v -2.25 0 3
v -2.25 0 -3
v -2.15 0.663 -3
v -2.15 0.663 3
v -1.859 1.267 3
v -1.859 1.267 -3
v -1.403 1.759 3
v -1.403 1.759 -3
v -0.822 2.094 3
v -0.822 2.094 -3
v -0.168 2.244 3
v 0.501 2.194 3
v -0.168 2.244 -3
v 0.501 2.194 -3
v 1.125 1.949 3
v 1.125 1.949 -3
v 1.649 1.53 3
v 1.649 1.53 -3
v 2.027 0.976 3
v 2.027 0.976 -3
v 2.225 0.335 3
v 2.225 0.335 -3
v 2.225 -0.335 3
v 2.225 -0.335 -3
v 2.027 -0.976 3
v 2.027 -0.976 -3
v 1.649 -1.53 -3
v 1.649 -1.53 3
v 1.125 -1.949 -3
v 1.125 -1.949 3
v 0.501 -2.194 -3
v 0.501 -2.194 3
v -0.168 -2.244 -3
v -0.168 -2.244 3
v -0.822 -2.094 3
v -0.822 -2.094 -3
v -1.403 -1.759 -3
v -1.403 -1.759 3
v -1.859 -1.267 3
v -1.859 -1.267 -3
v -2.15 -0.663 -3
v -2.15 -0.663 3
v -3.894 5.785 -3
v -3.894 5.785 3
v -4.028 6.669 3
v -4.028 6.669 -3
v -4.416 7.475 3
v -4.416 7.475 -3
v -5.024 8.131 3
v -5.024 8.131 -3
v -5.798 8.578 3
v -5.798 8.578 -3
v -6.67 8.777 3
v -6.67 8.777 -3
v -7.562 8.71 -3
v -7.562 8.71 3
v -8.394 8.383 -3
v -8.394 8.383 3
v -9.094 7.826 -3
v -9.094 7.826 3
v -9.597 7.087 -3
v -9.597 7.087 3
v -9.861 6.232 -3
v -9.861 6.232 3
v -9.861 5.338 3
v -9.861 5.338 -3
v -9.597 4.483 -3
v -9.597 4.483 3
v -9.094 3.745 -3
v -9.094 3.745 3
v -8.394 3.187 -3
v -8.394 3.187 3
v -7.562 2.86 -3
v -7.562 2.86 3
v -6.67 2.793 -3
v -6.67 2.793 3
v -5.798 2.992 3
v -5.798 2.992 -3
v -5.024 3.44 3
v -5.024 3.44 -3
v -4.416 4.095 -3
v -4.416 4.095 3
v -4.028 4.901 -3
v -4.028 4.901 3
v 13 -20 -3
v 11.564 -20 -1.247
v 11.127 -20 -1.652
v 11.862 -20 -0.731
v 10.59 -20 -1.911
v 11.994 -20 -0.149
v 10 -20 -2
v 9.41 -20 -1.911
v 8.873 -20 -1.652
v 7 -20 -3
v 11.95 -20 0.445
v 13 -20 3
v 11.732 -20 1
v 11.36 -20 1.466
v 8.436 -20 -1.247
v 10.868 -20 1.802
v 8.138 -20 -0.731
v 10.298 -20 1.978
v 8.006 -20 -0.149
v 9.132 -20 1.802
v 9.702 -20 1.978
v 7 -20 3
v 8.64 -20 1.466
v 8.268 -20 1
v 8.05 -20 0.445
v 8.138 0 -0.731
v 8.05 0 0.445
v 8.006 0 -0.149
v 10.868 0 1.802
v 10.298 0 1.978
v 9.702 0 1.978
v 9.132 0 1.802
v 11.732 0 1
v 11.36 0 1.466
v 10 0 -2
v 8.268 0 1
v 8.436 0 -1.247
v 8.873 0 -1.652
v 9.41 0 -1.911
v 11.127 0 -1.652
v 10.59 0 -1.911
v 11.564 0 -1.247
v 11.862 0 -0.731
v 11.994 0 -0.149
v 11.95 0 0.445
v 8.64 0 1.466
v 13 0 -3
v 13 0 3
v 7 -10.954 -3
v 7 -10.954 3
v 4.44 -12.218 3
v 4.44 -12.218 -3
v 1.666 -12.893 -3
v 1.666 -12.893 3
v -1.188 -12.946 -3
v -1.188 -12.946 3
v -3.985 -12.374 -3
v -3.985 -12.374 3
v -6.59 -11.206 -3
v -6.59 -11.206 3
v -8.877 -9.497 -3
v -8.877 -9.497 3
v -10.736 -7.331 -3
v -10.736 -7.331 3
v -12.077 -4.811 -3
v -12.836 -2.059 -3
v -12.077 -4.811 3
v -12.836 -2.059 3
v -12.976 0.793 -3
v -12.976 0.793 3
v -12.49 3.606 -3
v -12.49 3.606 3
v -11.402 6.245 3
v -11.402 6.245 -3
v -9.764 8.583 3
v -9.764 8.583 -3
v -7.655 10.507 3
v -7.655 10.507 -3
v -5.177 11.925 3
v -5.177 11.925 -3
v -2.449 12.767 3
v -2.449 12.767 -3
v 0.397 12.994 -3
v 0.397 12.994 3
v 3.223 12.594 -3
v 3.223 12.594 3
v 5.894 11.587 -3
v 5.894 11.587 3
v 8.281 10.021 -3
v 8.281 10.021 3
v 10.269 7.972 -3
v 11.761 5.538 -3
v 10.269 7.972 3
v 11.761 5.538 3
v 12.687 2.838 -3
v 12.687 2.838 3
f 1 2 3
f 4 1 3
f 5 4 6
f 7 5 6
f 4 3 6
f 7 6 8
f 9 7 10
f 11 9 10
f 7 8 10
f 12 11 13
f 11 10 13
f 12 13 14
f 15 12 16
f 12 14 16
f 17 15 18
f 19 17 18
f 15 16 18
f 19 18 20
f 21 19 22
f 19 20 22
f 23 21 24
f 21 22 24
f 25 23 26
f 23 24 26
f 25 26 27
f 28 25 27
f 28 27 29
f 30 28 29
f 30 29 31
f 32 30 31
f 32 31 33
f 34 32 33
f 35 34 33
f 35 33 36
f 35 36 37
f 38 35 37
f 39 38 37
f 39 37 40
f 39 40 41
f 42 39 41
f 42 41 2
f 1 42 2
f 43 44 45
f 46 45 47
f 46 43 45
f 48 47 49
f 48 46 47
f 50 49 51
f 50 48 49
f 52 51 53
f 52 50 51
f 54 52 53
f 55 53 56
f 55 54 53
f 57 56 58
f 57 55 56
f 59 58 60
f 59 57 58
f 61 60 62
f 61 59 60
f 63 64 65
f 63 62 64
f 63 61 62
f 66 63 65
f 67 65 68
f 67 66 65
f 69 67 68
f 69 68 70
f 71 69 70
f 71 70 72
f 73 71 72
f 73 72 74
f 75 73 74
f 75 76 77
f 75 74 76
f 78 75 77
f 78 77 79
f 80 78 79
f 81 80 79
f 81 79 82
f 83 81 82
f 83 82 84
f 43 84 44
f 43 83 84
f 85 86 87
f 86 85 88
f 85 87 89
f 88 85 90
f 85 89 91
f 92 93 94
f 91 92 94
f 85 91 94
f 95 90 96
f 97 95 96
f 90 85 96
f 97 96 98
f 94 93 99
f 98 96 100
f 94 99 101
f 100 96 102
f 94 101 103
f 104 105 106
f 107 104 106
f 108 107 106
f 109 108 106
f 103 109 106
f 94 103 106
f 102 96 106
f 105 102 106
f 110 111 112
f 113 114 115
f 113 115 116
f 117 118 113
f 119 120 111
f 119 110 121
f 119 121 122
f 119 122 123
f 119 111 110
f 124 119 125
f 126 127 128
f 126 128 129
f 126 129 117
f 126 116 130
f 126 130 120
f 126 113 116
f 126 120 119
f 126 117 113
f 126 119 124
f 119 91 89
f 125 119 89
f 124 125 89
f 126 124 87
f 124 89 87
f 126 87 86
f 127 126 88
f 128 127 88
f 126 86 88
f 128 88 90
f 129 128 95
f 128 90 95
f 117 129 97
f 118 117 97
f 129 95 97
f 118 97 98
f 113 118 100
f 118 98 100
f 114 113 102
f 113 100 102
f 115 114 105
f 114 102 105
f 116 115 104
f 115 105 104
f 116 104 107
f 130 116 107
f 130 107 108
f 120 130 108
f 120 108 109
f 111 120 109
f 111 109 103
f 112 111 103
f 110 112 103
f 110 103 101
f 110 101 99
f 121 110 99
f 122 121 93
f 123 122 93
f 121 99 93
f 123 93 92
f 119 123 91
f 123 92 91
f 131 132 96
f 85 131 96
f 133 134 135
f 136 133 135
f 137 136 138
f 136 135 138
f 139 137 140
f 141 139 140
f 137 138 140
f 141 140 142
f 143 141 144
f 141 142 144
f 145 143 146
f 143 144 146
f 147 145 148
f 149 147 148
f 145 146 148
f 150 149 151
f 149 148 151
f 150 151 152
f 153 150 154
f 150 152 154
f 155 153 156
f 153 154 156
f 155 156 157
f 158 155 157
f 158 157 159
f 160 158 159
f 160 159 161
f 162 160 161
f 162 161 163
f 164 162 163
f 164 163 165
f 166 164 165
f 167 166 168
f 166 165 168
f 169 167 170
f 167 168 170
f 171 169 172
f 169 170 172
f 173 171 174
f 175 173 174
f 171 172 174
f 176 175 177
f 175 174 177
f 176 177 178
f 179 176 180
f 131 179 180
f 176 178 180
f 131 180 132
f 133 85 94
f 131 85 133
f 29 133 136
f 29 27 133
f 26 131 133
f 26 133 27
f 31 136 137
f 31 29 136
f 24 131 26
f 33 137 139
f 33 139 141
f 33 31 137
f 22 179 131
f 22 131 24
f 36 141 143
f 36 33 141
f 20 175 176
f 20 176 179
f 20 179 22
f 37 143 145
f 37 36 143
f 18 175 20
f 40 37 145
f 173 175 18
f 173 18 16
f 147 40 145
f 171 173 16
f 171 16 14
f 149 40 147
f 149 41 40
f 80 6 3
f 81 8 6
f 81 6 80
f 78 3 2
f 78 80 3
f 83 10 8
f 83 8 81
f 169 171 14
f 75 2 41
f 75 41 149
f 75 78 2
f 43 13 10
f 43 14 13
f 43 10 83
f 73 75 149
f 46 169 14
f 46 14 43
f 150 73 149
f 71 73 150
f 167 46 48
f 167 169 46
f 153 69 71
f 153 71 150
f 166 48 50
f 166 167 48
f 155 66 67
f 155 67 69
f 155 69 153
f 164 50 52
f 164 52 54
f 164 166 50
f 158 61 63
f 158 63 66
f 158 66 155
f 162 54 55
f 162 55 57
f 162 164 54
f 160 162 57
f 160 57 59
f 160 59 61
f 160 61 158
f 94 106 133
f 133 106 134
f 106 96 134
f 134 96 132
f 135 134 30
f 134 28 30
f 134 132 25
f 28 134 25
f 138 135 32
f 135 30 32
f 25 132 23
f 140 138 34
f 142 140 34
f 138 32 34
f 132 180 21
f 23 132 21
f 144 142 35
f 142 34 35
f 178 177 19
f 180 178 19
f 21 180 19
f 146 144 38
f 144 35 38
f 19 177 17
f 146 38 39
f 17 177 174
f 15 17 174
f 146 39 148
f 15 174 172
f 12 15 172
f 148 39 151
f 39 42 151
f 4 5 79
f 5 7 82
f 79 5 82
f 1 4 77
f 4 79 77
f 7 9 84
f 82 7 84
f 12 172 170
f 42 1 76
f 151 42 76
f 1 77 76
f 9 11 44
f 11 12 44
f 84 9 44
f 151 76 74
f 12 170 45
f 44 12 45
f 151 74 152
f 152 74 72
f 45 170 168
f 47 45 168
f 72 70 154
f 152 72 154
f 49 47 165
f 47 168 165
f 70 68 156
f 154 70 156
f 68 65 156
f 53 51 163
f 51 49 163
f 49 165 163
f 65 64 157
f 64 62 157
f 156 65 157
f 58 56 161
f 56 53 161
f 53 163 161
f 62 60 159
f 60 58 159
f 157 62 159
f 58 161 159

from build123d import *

# Parameters (mm, degrees)
BOSS_EXTRUDE1_DEPTH  = 3
M4_CLEARANCE_HOLE1_D = 4.5
SKETCH5_R            = 2
CUT_EXTRUDE1_DEPTH   = 20
SKETCH8_R            = 3
CUT_EXTRUDE3_DEPTH   = 25.596747752


with BuildPart() as part:
    # Sketch2 → Boss-Extrude1 (new, symmetric)
    with BuildSketch(Plane.XY):
        with BuildLine():
            Line((13, 0), (13, -20))
            Line((13, -20), (7, -20))
            Line((7, -20), (7, -10.95445115))
            ThreePointArc((7, -10.95445115), (-11.401754251, 6.244997998), (13, 0))
        make_face()
    extrude(amount=BOSS_EXTRUDE1_DEPTH, both=True)

    # M4 Clearance Hole1 (through all)
    with Locations(Plane.XY.offset(3)):
        with Locations((0, 0)):
            Hole(M4_CLEARANCE_HOLE1_D / 2)

    # Sketch5 → Cut-Extrude1 (cut)
    with BuildSketch(Plane.XZ.offset(20)):
        with Locations(Location((10, 0, 0), (0, 0, 270))):
            Circle(SKETCH5_R)
    extrude(amount=-CUT_EXTRUDE1_DEPTH, mode=Mode.SUBTRACT)

    # Sketch8 → Cut-Extrude3 (cut, through all)
    with BuildSketch(Plane.XY.offset(-3)):
        with Locations((-6.894399988, 5.785088487)):
            Circle(SKETCH8_R)
    extrude(amount=CUT_EXTRUDE3_DEPTH, mode=Mode.SUBTRACT)


solid = part.part
